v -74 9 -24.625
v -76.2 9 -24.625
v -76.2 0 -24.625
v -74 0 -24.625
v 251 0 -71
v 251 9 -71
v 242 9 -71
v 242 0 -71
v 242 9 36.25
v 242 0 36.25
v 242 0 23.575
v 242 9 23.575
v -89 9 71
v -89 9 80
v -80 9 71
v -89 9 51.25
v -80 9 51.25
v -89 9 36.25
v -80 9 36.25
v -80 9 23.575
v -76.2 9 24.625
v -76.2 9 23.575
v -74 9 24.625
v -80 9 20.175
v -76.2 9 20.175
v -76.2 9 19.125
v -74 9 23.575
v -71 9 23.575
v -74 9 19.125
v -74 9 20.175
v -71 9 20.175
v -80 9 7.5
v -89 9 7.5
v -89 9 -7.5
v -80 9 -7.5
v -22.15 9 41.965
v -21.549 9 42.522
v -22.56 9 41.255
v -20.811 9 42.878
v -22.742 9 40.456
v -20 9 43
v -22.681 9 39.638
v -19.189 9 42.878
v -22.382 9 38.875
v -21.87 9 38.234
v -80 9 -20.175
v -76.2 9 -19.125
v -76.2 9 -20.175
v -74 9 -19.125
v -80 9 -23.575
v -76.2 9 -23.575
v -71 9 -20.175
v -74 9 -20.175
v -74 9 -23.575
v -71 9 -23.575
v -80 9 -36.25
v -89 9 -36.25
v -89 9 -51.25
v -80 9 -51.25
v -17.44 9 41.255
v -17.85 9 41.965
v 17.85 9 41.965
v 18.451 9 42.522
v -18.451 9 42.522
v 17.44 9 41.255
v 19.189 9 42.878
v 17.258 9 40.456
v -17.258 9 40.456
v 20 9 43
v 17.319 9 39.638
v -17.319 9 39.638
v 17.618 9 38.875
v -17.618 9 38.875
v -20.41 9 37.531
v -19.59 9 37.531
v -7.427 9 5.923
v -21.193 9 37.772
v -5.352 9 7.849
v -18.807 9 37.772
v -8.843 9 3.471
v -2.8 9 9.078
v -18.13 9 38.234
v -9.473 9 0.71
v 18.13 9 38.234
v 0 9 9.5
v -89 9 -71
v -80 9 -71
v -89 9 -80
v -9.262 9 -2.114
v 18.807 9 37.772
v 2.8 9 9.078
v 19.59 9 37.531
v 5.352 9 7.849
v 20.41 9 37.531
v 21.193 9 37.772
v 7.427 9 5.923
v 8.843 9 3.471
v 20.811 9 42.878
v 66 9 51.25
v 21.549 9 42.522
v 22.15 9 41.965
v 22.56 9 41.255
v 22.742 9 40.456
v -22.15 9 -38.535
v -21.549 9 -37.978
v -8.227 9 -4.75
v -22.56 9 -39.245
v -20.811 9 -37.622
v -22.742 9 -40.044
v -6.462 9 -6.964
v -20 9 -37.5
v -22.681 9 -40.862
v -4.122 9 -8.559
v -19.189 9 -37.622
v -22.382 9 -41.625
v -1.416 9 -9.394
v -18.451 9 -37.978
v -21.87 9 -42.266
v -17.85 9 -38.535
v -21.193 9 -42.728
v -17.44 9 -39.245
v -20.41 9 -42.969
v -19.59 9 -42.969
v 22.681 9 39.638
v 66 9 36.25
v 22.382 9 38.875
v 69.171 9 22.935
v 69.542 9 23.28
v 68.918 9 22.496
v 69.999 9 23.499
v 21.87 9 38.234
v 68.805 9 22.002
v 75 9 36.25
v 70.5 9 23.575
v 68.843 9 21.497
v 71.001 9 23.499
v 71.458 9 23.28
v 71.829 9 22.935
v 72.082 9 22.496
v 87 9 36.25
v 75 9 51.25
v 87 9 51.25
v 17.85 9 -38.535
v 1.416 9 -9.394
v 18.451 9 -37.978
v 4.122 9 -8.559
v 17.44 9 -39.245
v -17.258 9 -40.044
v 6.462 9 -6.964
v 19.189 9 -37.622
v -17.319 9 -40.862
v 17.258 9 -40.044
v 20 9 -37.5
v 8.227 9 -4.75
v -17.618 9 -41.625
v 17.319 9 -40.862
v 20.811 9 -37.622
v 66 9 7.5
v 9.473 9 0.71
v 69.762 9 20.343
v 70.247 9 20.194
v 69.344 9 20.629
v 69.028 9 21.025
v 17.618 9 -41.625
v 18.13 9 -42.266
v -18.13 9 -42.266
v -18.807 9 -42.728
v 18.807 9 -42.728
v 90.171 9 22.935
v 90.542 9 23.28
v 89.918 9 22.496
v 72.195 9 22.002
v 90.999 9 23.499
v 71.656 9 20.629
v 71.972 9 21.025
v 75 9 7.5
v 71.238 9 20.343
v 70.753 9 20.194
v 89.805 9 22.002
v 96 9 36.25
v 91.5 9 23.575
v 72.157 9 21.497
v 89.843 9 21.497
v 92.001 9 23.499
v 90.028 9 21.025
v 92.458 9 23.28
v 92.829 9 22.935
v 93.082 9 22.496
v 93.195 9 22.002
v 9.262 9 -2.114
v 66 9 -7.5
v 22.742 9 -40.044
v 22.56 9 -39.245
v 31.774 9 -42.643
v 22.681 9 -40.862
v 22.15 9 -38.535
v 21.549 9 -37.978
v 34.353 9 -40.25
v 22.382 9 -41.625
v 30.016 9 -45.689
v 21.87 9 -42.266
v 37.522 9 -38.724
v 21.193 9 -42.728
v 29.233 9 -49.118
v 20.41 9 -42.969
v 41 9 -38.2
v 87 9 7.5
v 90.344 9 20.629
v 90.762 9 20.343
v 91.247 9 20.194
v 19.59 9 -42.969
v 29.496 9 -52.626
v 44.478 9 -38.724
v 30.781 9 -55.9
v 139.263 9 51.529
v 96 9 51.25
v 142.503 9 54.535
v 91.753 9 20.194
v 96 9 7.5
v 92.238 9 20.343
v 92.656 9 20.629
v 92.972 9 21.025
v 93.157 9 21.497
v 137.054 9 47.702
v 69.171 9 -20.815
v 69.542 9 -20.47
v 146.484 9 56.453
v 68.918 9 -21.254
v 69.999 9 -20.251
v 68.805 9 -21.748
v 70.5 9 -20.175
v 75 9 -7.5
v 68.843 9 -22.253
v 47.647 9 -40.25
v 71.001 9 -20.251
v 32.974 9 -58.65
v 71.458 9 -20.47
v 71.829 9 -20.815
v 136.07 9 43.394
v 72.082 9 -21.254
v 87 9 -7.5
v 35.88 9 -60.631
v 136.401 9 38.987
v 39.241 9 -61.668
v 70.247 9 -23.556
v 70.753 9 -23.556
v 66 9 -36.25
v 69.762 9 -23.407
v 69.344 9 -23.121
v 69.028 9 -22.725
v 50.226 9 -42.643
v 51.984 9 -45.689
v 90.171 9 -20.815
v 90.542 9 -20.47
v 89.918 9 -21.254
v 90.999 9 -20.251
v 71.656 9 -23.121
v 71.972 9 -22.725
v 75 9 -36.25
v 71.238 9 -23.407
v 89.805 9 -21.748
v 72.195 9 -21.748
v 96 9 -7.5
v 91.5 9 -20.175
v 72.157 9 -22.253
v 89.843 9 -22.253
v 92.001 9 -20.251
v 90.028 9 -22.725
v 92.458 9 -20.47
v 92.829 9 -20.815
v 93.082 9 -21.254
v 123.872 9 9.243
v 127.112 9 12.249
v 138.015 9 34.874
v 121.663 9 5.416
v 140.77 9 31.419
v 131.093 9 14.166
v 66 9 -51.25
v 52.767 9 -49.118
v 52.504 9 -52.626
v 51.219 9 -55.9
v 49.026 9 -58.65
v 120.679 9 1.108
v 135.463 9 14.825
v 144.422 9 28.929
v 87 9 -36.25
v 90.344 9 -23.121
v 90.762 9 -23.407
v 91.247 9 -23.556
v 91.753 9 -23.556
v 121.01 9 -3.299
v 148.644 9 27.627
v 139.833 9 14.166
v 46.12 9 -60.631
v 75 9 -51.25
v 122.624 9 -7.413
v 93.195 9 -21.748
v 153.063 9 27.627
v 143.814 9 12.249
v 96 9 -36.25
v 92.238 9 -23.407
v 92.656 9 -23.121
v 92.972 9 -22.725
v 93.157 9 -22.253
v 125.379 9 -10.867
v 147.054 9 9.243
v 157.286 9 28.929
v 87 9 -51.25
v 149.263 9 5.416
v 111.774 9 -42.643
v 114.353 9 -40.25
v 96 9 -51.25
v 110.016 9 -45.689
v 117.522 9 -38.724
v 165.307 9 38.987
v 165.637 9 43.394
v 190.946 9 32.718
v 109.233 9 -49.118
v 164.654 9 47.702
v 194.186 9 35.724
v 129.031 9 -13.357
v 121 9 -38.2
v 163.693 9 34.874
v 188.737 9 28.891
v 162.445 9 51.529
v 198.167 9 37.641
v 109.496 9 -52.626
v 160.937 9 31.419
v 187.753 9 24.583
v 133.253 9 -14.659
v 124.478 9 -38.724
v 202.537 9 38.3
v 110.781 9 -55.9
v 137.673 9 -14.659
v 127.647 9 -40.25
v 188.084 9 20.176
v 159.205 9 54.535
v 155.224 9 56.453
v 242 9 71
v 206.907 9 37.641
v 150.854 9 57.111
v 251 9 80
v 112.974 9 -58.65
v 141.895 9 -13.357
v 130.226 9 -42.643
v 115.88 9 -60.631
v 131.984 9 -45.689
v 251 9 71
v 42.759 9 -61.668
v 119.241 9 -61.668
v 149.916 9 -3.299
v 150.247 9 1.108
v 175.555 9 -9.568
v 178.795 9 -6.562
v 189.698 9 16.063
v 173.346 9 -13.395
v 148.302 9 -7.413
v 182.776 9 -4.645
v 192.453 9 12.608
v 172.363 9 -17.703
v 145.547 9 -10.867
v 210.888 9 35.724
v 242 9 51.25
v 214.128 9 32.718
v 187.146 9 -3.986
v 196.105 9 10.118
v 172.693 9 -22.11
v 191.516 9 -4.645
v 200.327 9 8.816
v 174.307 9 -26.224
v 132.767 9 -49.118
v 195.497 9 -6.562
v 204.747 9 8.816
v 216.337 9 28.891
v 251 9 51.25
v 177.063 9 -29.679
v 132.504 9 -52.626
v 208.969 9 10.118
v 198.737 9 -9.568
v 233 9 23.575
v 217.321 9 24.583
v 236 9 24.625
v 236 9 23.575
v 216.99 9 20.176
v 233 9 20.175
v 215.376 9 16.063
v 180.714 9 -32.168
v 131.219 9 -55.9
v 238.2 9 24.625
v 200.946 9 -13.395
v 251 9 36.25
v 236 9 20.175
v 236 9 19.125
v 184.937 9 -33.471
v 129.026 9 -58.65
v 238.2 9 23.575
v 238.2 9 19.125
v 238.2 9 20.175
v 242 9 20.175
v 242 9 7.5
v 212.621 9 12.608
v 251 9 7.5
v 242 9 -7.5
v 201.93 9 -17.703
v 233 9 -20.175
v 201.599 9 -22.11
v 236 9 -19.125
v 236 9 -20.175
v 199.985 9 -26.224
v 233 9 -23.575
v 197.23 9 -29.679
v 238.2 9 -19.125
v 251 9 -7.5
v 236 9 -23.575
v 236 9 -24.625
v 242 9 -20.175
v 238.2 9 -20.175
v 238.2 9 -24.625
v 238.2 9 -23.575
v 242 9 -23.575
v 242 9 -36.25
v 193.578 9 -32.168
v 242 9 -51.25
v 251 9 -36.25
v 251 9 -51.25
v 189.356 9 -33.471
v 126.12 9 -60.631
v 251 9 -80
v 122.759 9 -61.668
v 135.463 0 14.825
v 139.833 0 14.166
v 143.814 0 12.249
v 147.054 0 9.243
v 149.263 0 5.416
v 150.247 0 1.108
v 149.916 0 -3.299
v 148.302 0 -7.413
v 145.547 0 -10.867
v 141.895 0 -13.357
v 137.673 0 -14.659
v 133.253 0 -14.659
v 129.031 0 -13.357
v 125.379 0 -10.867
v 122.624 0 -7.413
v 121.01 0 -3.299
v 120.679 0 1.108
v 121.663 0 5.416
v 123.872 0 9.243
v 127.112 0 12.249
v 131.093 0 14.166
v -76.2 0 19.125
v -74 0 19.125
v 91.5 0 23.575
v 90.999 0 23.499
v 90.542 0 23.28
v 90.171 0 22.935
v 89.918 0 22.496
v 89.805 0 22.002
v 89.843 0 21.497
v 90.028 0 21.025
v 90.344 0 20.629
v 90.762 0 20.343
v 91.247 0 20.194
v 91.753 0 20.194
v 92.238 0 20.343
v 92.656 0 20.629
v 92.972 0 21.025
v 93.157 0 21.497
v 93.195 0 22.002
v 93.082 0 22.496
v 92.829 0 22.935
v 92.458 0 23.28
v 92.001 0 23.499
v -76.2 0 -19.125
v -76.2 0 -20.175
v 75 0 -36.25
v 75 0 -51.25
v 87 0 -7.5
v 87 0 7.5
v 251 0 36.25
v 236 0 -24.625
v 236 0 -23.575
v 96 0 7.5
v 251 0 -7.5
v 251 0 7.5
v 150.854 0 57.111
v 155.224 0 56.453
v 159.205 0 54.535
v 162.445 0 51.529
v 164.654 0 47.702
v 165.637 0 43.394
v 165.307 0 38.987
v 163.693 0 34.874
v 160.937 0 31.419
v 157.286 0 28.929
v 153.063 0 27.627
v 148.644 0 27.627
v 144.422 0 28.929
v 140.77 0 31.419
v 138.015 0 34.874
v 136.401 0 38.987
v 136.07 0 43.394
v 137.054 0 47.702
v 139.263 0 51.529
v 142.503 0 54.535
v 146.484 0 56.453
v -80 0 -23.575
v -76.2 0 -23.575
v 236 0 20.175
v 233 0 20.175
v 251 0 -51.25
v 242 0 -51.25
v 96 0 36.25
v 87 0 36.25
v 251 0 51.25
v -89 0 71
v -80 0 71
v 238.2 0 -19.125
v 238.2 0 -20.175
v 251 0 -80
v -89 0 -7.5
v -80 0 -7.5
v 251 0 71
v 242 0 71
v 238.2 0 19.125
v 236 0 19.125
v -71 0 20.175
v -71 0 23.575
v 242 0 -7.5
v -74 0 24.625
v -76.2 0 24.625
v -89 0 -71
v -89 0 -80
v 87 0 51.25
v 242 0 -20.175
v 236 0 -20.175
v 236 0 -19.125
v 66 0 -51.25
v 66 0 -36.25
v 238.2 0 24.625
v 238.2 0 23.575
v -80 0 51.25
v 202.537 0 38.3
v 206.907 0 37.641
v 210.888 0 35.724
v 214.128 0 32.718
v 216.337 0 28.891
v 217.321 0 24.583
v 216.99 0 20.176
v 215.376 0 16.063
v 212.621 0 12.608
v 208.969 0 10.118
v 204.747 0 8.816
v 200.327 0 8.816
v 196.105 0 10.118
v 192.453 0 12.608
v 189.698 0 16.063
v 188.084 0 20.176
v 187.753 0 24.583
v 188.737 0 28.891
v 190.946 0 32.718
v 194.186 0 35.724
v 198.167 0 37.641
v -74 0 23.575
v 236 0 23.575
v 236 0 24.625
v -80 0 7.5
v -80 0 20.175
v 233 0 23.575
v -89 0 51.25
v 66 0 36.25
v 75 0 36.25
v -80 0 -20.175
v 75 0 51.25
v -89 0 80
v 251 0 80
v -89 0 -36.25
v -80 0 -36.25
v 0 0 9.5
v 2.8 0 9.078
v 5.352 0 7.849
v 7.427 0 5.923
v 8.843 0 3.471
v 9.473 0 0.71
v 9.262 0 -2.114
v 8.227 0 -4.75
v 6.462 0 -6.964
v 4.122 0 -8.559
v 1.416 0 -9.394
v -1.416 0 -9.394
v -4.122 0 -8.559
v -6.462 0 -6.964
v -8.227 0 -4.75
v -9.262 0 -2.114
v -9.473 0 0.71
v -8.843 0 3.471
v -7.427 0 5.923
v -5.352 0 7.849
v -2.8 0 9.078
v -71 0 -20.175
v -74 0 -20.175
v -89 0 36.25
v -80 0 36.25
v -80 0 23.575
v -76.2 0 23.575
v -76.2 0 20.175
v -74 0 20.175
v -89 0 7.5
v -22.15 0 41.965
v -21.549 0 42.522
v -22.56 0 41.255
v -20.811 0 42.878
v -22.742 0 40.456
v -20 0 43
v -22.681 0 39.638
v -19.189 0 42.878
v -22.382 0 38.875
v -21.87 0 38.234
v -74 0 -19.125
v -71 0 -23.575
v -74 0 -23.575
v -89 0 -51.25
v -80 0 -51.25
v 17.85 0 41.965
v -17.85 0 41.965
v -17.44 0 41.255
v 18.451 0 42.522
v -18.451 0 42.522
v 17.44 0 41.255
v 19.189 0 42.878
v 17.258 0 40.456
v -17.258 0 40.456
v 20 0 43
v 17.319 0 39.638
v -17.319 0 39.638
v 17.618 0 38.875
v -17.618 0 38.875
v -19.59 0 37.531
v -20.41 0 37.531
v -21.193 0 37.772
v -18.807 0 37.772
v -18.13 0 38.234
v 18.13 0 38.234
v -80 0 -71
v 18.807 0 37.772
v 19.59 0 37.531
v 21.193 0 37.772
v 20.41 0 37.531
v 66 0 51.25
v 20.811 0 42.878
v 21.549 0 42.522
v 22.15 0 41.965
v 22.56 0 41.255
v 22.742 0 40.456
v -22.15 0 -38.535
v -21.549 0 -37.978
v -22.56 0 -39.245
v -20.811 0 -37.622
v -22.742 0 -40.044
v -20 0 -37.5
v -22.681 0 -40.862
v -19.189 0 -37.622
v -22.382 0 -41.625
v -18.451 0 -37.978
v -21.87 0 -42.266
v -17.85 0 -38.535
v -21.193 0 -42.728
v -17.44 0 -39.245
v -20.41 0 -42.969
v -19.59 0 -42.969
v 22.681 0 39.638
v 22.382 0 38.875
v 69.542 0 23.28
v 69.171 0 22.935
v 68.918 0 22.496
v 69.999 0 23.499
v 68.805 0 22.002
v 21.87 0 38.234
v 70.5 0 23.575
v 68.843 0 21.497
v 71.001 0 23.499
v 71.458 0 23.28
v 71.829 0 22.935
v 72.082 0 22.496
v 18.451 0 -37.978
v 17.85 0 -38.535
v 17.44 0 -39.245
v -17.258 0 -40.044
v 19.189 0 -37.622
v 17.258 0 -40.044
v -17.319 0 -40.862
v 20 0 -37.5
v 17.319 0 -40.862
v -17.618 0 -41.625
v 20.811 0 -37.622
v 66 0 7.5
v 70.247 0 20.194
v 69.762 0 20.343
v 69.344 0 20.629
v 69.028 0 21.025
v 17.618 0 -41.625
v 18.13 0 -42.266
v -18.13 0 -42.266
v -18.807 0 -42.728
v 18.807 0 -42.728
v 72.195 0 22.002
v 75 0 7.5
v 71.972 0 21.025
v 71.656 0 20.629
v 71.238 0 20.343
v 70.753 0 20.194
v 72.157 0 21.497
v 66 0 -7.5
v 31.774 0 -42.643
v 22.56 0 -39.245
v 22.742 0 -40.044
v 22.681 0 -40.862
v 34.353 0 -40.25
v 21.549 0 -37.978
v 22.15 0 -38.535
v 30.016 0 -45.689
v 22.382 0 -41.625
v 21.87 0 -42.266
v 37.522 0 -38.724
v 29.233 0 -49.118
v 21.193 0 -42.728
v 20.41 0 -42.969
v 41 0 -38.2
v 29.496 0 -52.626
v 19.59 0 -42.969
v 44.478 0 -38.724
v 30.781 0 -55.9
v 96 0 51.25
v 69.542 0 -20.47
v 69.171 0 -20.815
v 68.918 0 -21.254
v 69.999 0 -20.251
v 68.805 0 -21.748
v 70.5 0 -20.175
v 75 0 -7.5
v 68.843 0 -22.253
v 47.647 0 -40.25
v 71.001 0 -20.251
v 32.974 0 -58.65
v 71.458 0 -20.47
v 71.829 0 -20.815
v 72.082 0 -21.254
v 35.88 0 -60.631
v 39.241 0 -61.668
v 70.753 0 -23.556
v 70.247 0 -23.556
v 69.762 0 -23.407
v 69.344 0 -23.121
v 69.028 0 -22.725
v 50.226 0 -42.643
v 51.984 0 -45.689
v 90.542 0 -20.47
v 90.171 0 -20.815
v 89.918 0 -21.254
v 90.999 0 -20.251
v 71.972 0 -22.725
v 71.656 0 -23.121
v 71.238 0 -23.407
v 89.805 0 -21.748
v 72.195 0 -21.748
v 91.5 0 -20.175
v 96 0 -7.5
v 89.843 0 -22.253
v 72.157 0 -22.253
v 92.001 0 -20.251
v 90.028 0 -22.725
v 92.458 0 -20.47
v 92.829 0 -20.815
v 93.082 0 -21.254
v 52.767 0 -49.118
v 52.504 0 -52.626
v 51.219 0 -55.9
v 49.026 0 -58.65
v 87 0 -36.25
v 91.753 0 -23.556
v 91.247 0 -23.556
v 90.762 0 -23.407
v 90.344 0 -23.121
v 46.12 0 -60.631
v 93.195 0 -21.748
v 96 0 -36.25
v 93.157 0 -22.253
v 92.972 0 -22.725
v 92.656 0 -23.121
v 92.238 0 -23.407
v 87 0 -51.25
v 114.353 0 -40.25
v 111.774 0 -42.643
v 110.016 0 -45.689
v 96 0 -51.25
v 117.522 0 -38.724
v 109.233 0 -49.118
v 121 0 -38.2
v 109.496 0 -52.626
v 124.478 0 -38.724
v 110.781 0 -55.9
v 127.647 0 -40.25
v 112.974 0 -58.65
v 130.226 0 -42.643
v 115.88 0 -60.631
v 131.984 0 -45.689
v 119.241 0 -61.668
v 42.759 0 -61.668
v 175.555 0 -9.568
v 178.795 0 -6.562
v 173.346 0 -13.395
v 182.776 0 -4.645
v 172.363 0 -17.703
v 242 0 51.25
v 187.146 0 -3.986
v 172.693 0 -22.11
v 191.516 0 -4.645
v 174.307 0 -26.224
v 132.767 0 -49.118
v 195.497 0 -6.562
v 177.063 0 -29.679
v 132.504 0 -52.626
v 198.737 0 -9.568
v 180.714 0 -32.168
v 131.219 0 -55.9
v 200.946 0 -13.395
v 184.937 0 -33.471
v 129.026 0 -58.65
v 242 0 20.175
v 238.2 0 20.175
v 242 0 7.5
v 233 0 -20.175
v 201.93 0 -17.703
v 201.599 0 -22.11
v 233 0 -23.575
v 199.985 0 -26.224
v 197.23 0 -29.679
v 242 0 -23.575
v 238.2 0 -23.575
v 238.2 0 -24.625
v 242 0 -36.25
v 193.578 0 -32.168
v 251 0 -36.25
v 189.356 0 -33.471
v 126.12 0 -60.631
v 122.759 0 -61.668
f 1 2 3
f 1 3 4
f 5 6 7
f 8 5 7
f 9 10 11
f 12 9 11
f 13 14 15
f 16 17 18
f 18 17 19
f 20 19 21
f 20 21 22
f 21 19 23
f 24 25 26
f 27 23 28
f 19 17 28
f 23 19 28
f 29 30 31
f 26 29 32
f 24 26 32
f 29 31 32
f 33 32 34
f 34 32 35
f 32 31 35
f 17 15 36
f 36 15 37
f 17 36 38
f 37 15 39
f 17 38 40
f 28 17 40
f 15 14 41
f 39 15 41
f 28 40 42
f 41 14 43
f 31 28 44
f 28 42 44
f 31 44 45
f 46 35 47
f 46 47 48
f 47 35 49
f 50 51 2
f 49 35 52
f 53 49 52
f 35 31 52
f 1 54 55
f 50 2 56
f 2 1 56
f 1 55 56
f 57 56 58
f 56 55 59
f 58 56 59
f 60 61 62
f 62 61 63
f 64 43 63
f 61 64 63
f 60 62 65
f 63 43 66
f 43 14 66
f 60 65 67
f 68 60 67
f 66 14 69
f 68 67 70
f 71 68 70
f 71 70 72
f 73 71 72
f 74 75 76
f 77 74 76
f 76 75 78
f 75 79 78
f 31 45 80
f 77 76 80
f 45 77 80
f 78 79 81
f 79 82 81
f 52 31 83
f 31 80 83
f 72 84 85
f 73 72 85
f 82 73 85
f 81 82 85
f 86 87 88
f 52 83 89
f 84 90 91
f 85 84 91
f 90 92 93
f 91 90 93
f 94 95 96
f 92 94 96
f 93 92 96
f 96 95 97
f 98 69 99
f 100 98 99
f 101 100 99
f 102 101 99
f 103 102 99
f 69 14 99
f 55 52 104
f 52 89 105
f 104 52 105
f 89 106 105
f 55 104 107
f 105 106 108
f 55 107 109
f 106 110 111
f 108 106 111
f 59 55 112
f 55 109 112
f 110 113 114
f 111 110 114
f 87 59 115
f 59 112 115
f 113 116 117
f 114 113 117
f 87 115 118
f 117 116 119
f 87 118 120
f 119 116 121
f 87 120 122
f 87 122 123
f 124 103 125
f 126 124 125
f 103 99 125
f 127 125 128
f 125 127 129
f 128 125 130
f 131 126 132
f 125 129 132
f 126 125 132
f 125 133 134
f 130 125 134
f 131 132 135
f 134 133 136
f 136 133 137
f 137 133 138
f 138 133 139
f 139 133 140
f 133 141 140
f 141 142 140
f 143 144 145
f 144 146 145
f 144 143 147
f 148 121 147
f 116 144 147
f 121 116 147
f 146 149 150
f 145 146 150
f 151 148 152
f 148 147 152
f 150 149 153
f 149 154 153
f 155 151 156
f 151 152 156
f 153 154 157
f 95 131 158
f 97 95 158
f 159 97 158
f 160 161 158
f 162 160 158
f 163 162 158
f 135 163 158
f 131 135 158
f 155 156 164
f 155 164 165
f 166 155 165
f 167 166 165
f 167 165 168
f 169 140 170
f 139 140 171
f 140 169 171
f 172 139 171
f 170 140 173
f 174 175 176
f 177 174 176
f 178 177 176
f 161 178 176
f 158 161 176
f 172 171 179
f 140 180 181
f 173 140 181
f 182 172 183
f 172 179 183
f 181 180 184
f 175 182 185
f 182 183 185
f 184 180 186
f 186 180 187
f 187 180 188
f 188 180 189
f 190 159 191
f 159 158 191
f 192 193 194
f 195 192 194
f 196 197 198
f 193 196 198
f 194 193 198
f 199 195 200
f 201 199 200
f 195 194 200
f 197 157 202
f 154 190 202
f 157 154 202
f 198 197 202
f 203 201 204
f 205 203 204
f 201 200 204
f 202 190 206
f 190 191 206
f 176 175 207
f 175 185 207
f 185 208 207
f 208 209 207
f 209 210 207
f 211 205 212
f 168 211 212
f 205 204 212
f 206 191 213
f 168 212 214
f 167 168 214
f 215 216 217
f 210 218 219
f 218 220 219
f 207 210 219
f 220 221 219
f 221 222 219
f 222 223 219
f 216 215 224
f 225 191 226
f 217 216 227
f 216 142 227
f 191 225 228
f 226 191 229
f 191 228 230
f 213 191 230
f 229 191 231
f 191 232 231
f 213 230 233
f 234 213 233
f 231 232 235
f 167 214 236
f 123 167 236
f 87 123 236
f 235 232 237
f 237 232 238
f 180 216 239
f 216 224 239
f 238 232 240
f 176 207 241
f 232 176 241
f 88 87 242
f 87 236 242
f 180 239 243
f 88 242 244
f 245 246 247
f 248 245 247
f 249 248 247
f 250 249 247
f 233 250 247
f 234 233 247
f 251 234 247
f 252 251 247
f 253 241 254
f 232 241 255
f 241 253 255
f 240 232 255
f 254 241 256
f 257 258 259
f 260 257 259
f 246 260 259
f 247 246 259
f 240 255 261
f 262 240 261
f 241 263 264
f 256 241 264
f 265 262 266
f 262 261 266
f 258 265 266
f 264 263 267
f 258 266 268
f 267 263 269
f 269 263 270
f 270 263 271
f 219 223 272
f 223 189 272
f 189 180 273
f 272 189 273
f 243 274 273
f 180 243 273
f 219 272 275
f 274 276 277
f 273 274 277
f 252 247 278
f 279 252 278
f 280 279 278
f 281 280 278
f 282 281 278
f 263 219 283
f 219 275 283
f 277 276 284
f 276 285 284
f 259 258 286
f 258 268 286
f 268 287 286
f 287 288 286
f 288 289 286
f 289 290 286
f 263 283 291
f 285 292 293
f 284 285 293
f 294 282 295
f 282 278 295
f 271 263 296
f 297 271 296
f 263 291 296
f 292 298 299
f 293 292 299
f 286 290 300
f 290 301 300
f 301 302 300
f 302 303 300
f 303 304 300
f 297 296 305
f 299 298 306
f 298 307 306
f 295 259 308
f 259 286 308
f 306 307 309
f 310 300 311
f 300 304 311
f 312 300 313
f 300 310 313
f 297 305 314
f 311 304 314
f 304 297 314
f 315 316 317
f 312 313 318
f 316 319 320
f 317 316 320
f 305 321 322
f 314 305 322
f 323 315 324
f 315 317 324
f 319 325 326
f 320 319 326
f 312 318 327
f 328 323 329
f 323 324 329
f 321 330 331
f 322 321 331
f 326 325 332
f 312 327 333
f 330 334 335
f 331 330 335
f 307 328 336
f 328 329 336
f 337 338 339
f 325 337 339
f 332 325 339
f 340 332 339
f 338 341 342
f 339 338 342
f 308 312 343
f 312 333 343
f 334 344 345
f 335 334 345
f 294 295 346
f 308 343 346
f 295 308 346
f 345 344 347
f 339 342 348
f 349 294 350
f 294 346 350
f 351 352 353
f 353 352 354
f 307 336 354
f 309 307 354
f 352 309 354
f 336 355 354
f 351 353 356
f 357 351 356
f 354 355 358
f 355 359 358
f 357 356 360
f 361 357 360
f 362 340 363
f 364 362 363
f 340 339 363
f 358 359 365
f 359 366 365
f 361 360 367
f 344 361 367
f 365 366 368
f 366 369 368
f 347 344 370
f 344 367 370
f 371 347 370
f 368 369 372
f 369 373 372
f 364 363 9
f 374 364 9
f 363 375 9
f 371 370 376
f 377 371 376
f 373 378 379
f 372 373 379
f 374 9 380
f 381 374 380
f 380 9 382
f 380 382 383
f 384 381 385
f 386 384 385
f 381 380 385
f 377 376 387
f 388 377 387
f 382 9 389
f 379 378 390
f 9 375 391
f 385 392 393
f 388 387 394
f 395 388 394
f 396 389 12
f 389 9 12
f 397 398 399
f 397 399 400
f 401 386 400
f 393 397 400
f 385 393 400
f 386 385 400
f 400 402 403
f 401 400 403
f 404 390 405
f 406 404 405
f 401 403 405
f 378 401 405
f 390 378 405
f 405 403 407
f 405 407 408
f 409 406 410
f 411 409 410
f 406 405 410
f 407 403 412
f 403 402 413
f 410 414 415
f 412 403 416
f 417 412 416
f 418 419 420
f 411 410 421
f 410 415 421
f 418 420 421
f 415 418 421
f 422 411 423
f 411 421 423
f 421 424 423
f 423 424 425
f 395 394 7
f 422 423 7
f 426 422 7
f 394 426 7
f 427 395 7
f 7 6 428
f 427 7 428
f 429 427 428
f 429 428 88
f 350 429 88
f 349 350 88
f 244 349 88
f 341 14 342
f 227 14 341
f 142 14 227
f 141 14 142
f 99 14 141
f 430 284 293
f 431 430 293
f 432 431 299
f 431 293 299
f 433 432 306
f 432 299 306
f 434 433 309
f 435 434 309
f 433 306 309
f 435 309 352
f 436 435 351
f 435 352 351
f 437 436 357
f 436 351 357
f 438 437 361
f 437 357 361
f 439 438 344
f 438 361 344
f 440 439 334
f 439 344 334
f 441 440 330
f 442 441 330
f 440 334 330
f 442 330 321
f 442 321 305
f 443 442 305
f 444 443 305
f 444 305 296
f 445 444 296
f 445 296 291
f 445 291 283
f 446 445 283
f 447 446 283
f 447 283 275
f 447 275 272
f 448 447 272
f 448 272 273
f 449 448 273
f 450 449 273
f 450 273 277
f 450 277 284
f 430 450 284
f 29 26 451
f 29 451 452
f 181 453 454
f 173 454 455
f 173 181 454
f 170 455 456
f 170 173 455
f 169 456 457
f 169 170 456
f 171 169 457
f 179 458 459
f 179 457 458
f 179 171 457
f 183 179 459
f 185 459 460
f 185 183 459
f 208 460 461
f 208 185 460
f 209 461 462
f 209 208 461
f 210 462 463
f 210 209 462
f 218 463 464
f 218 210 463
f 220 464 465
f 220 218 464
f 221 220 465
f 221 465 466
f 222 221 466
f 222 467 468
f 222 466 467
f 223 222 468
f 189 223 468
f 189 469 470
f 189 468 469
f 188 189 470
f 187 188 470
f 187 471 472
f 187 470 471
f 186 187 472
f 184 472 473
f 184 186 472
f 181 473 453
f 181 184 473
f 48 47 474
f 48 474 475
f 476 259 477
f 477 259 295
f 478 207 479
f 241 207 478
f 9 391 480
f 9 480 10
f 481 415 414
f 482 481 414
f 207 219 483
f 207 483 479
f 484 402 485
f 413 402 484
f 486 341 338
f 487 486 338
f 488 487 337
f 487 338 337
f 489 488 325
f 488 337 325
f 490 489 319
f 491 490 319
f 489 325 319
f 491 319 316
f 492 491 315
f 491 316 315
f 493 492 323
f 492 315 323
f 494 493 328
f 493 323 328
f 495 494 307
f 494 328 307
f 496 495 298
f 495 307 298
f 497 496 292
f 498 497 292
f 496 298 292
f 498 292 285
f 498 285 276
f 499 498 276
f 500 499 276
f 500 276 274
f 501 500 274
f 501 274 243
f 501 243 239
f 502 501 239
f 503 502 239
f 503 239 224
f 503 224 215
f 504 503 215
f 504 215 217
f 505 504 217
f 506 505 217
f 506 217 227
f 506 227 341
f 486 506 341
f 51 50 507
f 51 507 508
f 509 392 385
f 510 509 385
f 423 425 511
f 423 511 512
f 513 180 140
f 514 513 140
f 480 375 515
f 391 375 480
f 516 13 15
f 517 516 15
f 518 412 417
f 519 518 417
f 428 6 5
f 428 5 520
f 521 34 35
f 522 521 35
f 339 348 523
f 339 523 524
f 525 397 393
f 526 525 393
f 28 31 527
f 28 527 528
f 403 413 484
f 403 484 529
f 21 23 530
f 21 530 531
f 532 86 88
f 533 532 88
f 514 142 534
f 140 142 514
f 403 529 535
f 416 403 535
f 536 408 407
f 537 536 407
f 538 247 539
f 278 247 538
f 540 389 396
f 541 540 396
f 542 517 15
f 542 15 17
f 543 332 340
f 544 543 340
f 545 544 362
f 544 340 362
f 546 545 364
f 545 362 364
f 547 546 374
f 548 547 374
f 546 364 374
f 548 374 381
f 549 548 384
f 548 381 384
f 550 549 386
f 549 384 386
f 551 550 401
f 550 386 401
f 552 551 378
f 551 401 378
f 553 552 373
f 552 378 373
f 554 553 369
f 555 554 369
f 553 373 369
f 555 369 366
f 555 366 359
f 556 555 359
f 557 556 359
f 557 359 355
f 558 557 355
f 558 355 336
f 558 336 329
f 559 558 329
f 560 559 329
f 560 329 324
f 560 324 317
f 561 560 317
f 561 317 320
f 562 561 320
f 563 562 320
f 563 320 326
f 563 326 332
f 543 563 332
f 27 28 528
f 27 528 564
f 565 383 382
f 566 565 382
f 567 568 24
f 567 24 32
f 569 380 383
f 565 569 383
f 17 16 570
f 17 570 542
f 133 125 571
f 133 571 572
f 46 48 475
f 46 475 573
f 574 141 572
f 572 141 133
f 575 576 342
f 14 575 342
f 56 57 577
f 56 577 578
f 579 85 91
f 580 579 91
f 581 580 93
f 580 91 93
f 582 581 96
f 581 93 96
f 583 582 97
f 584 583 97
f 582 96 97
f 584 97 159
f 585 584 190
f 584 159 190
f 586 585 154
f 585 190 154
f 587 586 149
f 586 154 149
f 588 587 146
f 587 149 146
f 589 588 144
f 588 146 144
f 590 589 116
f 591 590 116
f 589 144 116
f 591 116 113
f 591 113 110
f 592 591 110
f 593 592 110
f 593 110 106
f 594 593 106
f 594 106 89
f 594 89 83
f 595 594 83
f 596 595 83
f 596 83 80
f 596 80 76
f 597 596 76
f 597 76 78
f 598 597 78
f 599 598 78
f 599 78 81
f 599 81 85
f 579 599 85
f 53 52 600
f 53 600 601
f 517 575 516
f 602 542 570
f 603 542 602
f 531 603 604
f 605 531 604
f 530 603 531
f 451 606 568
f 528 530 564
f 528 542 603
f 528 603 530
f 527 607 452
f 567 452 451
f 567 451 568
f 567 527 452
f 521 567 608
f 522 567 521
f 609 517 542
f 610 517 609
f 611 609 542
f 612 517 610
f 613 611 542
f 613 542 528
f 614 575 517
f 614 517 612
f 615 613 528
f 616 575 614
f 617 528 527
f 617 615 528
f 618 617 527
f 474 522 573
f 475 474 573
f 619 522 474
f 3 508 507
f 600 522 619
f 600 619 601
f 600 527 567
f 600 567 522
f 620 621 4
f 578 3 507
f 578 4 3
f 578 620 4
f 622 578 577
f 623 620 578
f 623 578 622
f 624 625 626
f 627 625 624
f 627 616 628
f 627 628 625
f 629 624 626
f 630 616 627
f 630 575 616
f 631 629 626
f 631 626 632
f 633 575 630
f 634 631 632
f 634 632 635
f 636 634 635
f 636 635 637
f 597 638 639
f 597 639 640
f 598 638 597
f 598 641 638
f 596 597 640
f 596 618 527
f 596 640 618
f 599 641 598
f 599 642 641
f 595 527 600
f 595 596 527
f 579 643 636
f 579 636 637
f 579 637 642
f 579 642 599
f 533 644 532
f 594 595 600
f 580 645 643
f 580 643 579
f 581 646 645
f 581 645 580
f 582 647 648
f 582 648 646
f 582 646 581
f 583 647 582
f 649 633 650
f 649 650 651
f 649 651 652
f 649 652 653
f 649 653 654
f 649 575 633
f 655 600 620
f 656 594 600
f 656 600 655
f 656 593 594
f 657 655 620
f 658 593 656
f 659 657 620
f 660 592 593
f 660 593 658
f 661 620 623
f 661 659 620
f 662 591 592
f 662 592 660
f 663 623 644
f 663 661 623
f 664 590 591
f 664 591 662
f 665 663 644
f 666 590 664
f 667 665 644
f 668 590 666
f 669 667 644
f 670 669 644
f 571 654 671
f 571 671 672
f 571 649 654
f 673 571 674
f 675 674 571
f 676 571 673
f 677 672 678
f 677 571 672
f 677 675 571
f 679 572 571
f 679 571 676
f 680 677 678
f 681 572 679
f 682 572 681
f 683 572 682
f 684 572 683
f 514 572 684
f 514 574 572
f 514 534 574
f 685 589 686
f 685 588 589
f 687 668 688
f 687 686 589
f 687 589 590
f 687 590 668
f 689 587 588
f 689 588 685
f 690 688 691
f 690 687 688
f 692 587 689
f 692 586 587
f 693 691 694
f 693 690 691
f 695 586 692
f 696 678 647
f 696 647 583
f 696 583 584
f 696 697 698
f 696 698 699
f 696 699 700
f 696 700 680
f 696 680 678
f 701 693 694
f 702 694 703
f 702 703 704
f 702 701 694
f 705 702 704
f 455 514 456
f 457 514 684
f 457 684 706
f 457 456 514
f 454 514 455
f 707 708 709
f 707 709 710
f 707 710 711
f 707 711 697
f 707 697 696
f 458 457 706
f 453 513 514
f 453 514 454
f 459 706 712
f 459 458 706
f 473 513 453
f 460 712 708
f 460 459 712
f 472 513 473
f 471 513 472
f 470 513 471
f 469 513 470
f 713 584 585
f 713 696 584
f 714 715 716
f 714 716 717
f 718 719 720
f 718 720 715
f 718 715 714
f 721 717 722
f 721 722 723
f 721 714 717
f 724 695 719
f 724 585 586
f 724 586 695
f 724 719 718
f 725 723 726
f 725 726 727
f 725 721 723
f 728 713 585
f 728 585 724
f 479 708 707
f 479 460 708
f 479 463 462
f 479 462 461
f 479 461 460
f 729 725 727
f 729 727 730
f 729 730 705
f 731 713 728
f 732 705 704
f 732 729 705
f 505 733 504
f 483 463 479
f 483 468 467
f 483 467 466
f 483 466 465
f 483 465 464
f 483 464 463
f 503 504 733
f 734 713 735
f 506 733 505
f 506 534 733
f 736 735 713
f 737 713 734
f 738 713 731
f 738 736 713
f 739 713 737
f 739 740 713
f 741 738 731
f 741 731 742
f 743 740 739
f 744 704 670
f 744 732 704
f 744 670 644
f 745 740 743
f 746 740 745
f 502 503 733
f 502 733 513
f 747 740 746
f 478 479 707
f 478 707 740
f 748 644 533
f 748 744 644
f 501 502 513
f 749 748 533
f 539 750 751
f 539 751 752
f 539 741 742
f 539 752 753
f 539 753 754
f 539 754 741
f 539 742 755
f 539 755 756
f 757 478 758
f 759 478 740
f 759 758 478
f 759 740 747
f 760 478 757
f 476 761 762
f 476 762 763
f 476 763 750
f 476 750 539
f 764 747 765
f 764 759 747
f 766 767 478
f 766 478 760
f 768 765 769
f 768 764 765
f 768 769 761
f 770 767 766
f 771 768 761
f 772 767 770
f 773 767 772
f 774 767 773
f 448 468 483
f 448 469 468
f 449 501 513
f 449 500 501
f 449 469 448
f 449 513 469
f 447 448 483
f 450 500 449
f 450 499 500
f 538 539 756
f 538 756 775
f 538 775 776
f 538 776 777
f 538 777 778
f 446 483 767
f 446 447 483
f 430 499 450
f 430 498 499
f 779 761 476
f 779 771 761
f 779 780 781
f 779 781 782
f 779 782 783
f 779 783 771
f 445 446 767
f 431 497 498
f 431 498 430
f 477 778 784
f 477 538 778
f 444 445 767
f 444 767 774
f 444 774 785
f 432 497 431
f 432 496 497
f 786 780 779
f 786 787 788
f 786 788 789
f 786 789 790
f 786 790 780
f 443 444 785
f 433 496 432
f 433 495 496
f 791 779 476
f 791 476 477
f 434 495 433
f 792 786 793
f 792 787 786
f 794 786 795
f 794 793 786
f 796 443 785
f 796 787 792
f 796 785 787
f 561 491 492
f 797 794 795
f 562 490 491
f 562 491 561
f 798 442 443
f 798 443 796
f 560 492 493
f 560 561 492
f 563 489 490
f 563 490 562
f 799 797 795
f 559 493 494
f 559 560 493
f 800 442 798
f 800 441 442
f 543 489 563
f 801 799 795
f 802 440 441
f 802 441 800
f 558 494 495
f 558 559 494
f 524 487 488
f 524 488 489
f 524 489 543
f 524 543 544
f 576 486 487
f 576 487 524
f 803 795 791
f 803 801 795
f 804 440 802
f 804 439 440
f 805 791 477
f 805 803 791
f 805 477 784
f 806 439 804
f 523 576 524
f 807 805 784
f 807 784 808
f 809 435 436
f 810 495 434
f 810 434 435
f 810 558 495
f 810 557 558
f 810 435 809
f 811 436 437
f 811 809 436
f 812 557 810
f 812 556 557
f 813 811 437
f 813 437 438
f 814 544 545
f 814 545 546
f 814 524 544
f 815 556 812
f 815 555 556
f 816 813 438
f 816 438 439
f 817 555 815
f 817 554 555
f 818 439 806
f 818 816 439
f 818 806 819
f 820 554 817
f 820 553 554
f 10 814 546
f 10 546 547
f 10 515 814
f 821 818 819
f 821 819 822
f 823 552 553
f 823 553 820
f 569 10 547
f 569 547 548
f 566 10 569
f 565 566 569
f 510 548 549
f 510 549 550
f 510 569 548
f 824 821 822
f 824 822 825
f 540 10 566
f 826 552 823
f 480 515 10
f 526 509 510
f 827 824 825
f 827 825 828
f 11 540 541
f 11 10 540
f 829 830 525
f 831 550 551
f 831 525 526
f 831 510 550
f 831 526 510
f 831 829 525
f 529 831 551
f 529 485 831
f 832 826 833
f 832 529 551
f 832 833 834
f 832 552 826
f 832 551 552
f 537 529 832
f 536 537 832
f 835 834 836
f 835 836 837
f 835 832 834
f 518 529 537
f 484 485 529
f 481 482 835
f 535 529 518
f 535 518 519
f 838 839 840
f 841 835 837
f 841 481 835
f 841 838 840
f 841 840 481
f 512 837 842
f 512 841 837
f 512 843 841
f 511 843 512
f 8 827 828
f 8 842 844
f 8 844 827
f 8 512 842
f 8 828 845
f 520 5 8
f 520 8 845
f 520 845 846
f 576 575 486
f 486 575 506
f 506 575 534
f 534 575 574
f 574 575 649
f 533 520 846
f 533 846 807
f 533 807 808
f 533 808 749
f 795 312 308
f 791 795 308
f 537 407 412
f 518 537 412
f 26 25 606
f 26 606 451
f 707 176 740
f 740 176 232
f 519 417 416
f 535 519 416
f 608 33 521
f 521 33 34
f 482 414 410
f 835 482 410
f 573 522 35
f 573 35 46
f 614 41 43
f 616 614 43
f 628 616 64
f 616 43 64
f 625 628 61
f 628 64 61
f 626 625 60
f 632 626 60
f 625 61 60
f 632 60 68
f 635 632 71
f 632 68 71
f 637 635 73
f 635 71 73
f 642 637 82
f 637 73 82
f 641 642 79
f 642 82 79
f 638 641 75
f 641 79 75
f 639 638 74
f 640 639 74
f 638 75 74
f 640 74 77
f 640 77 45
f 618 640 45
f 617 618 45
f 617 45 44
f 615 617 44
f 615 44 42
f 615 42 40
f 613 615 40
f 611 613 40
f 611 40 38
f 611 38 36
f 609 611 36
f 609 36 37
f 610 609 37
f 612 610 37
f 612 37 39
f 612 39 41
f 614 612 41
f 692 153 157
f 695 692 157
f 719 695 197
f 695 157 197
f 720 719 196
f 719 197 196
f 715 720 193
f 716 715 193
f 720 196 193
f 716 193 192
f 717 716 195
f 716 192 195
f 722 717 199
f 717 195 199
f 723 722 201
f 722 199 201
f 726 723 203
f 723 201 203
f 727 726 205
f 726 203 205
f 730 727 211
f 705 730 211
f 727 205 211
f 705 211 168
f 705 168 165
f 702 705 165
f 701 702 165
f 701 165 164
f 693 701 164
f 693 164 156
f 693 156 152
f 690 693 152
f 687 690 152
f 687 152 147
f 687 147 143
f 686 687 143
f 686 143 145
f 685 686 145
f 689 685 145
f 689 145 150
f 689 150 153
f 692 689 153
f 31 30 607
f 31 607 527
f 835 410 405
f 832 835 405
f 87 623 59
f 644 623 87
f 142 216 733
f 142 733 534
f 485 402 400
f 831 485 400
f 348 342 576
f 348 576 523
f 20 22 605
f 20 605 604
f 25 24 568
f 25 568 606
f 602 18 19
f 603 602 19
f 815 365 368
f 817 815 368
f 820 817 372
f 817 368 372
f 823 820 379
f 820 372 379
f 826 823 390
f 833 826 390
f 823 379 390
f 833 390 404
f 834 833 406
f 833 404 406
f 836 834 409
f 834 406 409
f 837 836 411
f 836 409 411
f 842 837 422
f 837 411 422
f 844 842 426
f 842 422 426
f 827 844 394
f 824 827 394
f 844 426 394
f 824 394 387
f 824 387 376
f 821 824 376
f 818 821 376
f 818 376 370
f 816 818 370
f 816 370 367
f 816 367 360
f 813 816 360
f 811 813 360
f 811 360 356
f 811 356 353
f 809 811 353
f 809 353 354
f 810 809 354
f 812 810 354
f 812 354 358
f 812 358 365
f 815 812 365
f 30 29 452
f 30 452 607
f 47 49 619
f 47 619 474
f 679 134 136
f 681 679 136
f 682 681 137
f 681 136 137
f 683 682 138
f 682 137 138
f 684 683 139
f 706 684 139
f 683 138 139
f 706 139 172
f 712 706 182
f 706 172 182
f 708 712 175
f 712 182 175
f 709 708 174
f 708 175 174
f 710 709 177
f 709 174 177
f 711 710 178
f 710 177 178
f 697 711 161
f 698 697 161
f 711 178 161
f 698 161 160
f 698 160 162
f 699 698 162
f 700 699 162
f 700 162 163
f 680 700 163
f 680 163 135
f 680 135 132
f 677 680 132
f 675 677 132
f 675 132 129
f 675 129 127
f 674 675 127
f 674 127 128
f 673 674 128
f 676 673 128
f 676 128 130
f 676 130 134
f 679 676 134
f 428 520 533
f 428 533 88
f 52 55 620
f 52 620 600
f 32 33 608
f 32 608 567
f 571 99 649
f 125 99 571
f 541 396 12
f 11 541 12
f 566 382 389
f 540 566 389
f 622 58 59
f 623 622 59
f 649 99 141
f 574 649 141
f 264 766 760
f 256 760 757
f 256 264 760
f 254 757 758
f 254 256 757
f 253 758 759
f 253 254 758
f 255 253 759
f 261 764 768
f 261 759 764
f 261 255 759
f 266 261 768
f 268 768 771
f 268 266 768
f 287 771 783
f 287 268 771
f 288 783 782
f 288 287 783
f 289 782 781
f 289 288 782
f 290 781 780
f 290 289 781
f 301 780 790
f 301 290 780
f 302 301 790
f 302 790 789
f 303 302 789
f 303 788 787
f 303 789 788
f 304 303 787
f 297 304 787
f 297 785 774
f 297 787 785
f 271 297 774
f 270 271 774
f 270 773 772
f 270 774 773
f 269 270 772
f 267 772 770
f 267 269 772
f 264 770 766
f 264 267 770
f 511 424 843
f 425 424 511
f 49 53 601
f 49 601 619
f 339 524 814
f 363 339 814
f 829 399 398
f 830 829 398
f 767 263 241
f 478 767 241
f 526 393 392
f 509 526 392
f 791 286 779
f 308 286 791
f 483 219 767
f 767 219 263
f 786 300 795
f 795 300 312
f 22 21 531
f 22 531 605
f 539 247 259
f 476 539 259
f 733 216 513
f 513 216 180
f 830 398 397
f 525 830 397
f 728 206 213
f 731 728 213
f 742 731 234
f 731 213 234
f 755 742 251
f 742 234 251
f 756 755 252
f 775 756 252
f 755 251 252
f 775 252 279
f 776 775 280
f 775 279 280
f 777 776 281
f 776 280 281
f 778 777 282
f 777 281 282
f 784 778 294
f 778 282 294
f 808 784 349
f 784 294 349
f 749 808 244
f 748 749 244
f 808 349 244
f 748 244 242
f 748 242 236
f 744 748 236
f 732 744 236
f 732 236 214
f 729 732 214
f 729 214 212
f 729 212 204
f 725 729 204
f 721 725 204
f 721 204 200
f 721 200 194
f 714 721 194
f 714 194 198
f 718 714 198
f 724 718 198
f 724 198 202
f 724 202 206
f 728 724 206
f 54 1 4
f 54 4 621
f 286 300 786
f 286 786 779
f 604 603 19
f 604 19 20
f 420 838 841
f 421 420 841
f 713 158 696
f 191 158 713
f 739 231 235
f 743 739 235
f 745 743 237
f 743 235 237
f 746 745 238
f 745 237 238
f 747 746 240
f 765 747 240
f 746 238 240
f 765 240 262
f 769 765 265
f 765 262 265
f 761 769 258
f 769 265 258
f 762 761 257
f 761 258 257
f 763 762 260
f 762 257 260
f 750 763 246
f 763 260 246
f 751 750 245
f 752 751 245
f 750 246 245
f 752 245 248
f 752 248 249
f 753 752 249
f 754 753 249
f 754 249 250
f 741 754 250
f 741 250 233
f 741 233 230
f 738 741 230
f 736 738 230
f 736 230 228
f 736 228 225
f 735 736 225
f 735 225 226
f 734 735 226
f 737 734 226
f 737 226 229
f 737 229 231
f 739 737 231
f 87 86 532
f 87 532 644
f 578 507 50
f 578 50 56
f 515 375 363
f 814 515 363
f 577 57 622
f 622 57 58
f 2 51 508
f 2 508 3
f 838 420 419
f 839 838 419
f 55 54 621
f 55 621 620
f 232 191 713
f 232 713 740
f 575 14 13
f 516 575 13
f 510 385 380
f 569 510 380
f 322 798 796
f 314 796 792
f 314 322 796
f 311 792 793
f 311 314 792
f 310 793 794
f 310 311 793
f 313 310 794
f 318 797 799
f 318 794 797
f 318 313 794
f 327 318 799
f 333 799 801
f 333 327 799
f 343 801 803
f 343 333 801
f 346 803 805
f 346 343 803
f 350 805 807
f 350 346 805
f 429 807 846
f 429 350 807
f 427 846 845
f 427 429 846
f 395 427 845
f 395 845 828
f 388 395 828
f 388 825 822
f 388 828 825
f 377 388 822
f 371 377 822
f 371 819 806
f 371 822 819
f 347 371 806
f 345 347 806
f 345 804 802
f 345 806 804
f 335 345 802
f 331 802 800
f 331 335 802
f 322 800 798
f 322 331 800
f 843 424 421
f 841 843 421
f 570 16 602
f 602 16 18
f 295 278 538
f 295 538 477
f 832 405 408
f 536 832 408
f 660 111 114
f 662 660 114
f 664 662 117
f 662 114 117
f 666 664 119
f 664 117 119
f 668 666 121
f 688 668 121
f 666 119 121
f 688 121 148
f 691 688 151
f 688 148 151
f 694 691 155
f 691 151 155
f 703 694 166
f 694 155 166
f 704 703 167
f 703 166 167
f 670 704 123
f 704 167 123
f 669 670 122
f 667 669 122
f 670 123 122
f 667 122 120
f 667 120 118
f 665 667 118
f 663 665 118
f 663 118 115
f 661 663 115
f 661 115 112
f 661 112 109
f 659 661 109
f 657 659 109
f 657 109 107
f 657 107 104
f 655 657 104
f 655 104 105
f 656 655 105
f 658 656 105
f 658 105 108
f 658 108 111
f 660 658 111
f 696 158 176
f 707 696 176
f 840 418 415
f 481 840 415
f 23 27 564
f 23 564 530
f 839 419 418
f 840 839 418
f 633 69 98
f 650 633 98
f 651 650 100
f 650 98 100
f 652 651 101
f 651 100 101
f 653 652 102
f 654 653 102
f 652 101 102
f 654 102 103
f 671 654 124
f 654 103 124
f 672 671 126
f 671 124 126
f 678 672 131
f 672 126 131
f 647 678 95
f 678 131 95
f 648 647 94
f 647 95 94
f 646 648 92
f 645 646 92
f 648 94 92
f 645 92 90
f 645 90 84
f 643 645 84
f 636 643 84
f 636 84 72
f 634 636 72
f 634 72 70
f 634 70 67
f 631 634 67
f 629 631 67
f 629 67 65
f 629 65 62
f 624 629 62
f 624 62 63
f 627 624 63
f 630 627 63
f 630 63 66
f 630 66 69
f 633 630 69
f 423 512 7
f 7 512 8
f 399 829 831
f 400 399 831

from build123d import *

# Parameters (mm, degrees)
SKETCH1_W           = 160
SKETCH1_H           = 160
BOSS_EXTRUDE1_DEPTH = 9
SKETCH2_W           = 9
SKETCH2_H           = 15
SKETCH2_H_2         = 9
BOSS_EXTRUDE2_DEPTH = 9
SKETCH3_R           = 1.7
SKETCH3_W           = 9
SKETCH3_H           = 15
CUT_EXTRUDE1_DEPTH  = 121.008333044
CUT_EXTRUDE2_DEPTH  = 121.008333044
SKETCH5_R           = 9.5
SKETCH5_R_2         = 2.75
CUT_EXTRUDE3_DEPTH  = 121.008333044
SKETCH6_W           = 160
SKETCH6_H           = 9
BOSS_EXTRUDE3_DEPTH = 1
SKETCH7_R           = 11.8
CUT_EXTRUDE4_DEPTH  = 121.008333044
SKETCH8_R           = 14.825
CUT_EXTRUDE5_DEPTH  = 264.594385373


with BuildPart() as part:
    # Sketch1 → Boss-Extrude1 (new body)
    with BuildSketch(Plane(origin=(0, 0, 0), x_dir=(1, 0, 0), z_dir=(0, 1, 0))):
        Rectangle(SKETCH1_W, SKETCH1_H)
    boss_extrude1 = extrude(amount=BOSS_EXTRUDE1_DEPTH)

    # Sketch2 → Boss-Extrude2 (add)
    with BuildSketch(Plane(origin=(0, 9, 0), x_dir=(1, 0, 0), z_dir=(0, 1, 0))):
        with Locations((-84.5, 0)):
            Rectangle(SKETCH2_W, SKETCH2_H)
        with Locations((-84.5, 43.75)):
            Rectangle(SKETCH2_W, SKETCH2_H)
        with Locations((-84.5, -43.75)):
            Rectangle(SKETCH2_W, SKETCH2_H)
        with Locations((-84.5, 75.5)):
            Rectangle(SKETCH2_W, SKETCH2_H_2)
        with Locations((-84.5, -75.5)):
            Rectangle(SKETCH2_W, SKETCH2_H_2)
    boss_extrude2 = extrude(amount=-BOSS_EXTRUDE2_DEPTH)

    # Sketch3 → Cut-Extrude1 (cut, through all)
    with BuildSketch(Plane(origin=(0, 9, 0), x_dir=(1, 0, 0), z_dir=(0, 1, 0))):
        with Locations(Location((70.5, 21.875, 0), (0, 0, 270))):
            Circle(SKETCH3_R)
        with Locations(Location((70.5, -21.875, 0), (0, 0, 270))):
            Circle(SKETCH3_R)
        with Locations((70.5, 43.75)):
            Rectangle(SKETCH3_W, SKETCH3_H)
        with Locations((70.5, 0)):
            Rectangle(SKETCH3_W, SKETCH3_H)
        with Locations((70.5, -43.75)):
            Rectangle(SKETCH3_W, SKETCH3_H)
    cut_extrude1 = extrude(amount=-CUT_EXTRUDE1_DEPTH, mode=Mode.SUBTRACT)

    # Sketch4 → Cut-Extrude2 (cut, through all)
    with BuildSketch(Plane(origin=(0, 9, 0), x_dir=(1, 0, 0), z_dir=(0, 1, 0))):
        Polygon((-80, 23.575), (-76.2, 23.575), (-76.2, 24.625), (-74, 24.625), (-74, 23.575), (-71, 23.575), (-71, 20.175), (-74, 20.175), (-74, 19.125), (-76.2, 19.125), (-76.2, 20.175), (-80, 20.175), align=None)
        Polygon((-80, -23.575), (-80, -20.175), (-76.2, -20.175), (-76.2, -19.125), (-74, -19.125), (-74, -20.175), (-71, -20.175), (-71, -23.575), (-74, -23.575), (-74, -24.625), (-76.2, -24.625), (-76.2, -23.575), align=None)
    cut_extrude2 = extrude(amount=-CUT_EXTRUDE2_DEPTH, mode=Mode.SUBTRACT)

    # Sketch5 → Cut-Extrude3 (cut, through all)
    with BuildSketch(Plane(origin=(0, 9, 0), x_dir=(1, 0, 0), z_dir=(0, 1, 0))):
        with Locations(Location((0, 0, 0), (0, 0, 270))):
            Circle(SKETCH5_R)
        with Locations(Location((-20, 40.25, 0), (0, 0, 270))):
            Circle(SKETCH5_R_2)
        with Locations(Location((20, 40.25, 0), (0, 0, 270))):
            Circle(SKETCH5_R_2)
        with Locations(Location((20, -40.25, 0), (0, 0, 270))):
            Circle(SKETCH5_R_2)
        with Locations(Location((-20, -40.25, 0), (0, 0, 270))):
            Circle(SKETCH5_R_2)
    extrude(amount=-CUT_EXTRUDE3_DEPTH, mode=Mode.SUBTRACT)

    # Sketch6 → Boss-Extrude3 (add)
    with BuildSketch(Plane(origin=(80, 0, 0), x_dir=(0, 0, -1), z_dir=(1, 0, 0))):
        with Locations((0, 4.5)):
            Rectangle(SKETCH6_W, SKETCH6_H)
    boss_extrude3 = extrude(amount=BOSS_EXTRUDE3_DEPTH)

    # Sketch7 → Cut-Extrude4 (cut, through all)
    with BuildSketch(Plane(origin=(0, 9, 0), x_dir=(1, 0, 0), z_dir=(0, 1, 0))):
        with Locations(Location((41, 50, 0), (0, 0, 270))):
            Circle(SKETCH7_R)
    cut_extrude4 = extrude(amount=-CUT_EXTRUDE4_DEPTH, mode=Mode.SUBTRACT)

    # Mirror1: Boss-Extrude1, Boss-Extrude2, Cut-Extrude1, Cut-Extrude2, Boss-Extrude3, Cut-Extrude4 across plane
    add(boss_extrude1.mirror(Plane.ZY.offset(-81)))
    add(boss_extrude2.mirror(Plane.ZY.offset(-81)))
    add(cut_extrude1.mirror(Plane.ZY.offset(-81)), mode=Mode.SUBTRACT)
    add(cut_extrude2.mirror(Plane.ZY.offset(-81)), mode=Mode.SUBTRACT)
    add(boss_extrude3.mirror(Plane.ZY.offset(-81)))
    add(cut_extrude4.mirror(Plane.ZY.offset(-81)), mode=Mode.SUBTRACT)

    # Sketch8 → Cut-Extrude5 (cut, through all)
    with BuildSketch(Plane(origin=(0, 9, 0), x_dir=(1, 0, 0), z_dir=(0, 1, 0))):
        with Locations(Location((135.462999704, 0, 0), (0, 0, 270))):
            Circle(SKETCH8_R)
        with Locations(Location((187.146093847, 18.811107883, 0), (0, 0, 270))):
            Circle(SKETCH8_R)
        with Locations(Location((202.537000296, -23.475060052, 0), (0, 0, 270))):
            Circle(SKETCH8_R)
        with Locations(Location((150.853906153, -42.286167935, 0), (0, 0, 270))):
            Circle(SKETCH8_R)
    extrude(amount=-CUT_EXTRUDE5_DEPTH, mode=Mode.SUBTRACT)


solid = part.part
